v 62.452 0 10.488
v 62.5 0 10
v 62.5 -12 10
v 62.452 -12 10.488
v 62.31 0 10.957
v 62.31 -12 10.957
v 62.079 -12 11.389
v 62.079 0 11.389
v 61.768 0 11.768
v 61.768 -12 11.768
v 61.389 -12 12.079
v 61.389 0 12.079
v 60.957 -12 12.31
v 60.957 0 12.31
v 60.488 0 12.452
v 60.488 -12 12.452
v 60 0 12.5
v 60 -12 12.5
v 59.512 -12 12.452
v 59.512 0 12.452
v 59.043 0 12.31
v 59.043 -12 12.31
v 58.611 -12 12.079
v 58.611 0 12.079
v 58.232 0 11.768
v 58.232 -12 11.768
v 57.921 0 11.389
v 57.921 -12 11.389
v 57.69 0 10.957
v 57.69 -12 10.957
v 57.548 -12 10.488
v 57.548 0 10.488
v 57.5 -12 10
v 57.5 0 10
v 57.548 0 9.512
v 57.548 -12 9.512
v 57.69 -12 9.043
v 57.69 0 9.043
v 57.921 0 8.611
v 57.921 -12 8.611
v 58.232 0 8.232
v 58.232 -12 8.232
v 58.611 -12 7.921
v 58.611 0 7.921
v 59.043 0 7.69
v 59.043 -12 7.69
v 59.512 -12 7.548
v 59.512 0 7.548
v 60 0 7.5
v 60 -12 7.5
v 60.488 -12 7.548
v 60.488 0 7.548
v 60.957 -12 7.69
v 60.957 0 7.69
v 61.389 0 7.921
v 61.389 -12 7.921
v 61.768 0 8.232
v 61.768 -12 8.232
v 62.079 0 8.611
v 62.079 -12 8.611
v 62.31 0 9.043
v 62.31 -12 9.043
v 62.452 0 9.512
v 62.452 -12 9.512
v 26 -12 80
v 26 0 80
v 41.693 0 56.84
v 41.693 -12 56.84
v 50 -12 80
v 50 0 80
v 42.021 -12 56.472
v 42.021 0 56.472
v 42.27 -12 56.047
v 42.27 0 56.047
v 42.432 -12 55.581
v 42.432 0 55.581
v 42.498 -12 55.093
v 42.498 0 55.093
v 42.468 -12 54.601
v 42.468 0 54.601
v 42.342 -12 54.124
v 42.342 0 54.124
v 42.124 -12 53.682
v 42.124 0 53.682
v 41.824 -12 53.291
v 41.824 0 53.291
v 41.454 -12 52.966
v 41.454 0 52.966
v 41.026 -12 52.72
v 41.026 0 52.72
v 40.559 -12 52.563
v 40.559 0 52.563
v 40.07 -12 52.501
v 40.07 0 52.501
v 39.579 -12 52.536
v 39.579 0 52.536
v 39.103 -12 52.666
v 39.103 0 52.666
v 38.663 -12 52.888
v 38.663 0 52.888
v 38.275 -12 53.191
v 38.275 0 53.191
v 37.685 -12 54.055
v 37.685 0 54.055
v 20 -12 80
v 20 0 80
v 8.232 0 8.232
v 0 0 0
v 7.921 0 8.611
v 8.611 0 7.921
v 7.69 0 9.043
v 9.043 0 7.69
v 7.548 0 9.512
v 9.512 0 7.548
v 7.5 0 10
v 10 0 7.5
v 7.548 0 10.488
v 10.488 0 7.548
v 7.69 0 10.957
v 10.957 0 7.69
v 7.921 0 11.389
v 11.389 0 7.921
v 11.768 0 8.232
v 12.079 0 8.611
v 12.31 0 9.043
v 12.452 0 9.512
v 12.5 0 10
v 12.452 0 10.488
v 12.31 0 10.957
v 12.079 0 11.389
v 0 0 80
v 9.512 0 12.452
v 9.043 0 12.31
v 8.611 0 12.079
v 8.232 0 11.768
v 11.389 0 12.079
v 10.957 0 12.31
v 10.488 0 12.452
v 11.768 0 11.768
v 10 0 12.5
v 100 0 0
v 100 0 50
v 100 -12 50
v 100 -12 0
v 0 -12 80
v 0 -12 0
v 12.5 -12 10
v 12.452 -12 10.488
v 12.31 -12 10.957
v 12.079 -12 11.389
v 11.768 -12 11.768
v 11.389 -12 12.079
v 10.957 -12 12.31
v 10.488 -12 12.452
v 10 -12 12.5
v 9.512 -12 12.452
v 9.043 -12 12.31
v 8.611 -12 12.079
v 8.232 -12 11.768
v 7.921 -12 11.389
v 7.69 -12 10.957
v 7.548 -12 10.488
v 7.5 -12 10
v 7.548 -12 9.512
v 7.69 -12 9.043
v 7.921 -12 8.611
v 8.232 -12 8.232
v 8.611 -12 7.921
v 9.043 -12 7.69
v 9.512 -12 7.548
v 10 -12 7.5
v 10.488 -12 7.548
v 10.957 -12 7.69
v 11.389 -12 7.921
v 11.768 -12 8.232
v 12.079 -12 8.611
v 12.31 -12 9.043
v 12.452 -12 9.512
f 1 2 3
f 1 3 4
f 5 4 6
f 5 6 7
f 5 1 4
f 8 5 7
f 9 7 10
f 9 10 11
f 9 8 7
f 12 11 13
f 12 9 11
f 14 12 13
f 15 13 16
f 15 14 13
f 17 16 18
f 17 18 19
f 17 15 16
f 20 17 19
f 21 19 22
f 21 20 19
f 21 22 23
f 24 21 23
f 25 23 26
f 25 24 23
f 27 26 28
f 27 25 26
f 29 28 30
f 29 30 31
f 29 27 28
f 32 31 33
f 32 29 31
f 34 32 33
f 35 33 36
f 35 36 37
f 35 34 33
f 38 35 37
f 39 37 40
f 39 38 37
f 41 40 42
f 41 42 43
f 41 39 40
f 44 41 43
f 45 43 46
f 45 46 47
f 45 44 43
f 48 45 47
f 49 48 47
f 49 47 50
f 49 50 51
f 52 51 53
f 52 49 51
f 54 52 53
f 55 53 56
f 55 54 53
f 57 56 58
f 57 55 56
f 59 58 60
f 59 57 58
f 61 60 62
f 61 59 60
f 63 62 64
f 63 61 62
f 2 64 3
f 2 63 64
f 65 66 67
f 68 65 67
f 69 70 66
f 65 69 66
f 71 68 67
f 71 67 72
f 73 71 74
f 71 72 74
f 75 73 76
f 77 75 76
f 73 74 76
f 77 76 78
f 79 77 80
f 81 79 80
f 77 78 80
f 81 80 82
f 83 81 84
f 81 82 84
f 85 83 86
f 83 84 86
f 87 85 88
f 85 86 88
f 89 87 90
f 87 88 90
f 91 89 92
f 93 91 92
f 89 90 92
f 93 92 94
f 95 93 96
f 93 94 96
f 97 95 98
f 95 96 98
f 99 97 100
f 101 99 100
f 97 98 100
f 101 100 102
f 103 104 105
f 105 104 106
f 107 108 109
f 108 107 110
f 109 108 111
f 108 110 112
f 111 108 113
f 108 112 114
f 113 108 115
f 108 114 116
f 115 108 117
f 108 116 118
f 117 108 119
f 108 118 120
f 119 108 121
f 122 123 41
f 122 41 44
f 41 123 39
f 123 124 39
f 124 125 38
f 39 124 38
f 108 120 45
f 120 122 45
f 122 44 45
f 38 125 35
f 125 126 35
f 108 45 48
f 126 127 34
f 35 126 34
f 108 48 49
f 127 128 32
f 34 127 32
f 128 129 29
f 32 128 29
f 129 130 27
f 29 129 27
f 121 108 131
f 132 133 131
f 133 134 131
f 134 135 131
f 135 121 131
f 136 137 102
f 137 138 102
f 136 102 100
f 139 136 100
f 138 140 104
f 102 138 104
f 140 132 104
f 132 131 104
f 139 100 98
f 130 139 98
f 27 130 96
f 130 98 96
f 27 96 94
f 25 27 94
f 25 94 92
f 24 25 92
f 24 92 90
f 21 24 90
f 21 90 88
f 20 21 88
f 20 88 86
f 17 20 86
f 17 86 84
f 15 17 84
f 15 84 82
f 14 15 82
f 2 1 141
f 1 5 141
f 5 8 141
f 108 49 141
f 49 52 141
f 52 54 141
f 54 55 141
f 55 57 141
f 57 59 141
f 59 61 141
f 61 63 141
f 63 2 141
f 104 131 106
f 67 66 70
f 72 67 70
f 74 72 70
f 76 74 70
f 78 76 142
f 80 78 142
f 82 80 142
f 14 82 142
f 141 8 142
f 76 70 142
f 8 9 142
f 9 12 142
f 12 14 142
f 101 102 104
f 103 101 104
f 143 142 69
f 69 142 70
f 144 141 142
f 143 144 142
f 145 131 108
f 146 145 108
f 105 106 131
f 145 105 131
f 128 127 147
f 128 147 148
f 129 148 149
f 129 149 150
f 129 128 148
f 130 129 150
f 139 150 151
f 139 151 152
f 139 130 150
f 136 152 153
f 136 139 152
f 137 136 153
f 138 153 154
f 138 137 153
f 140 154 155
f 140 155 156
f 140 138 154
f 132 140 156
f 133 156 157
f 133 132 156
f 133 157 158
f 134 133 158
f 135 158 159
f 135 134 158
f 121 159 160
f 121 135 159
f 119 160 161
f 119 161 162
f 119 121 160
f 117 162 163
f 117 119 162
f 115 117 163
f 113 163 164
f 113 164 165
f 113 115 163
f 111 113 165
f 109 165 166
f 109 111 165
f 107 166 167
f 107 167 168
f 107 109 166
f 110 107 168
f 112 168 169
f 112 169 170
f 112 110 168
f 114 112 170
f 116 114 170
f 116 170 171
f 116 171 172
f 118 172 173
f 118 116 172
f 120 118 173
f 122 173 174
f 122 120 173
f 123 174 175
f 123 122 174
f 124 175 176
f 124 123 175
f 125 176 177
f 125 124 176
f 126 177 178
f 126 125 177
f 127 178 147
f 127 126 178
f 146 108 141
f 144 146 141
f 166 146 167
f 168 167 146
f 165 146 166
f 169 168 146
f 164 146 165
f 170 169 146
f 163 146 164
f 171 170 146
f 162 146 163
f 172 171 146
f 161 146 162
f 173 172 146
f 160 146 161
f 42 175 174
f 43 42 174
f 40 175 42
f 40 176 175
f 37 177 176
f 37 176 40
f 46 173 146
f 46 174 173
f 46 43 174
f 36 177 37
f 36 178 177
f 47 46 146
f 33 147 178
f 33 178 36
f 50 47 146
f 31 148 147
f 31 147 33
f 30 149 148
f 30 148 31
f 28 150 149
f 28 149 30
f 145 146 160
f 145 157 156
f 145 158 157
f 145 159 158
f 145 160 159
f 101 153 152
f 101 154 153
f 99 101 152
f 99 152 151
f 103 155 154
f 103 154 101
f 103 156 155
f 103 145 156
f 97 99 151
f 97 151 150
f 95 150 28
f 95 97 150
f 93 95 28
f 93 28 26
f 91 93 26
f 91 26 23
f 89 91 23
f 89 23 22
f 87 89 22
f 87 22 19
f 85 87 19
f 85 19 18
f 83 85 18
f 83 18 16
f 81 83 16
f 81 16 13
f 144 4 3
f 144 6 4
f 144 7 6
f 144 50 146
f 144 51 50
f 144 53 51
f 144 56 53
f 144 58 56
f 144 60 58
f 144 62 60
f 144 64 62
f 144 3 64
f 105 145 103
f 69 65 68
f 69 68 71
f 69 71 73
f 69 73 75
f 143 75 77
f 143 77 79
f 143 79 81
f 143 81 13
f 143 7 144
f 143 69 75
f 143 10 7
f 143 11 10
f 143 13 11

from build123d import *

# Parameters (mm, degrees)
F0_R     = 2.5
F1_DEPTH = 12


with BuildPart() as f1:
    # F0 (on Front) → F1 (new body)
    with BuildSketch(Plane.XZ):
        with BuildLine():
            Line((0, 80), (0, 0))
            Line((0, 0), (100, 0))
            Line((100, 0), (100, 50))
            Line((100, 50), (50, 80))
            Line((50, 80), (26, 80))
            Line((26, 80), (41.692823, 56.83966))
            ThreePointArc((41.692823, 56.83966), (41.824435, 53.290779), (38.274518, 53.190937))
            Line((38.274518, 53.190937), (37.685428, 54.055142))
            Line((37.685428, 54.055142), (20, 80))
            Line((20, 80), (0, 80))
        make_face()
        with Locations((10, 10)):
            Circle(F0_R, mode=Mode.SUBTRACT)
        with Locations((60, 10)):
            Circle(F0_R, mode=Mode.SUBTRACT)
    extrude(amount=F1_DEPTH)


solid = f1.part
